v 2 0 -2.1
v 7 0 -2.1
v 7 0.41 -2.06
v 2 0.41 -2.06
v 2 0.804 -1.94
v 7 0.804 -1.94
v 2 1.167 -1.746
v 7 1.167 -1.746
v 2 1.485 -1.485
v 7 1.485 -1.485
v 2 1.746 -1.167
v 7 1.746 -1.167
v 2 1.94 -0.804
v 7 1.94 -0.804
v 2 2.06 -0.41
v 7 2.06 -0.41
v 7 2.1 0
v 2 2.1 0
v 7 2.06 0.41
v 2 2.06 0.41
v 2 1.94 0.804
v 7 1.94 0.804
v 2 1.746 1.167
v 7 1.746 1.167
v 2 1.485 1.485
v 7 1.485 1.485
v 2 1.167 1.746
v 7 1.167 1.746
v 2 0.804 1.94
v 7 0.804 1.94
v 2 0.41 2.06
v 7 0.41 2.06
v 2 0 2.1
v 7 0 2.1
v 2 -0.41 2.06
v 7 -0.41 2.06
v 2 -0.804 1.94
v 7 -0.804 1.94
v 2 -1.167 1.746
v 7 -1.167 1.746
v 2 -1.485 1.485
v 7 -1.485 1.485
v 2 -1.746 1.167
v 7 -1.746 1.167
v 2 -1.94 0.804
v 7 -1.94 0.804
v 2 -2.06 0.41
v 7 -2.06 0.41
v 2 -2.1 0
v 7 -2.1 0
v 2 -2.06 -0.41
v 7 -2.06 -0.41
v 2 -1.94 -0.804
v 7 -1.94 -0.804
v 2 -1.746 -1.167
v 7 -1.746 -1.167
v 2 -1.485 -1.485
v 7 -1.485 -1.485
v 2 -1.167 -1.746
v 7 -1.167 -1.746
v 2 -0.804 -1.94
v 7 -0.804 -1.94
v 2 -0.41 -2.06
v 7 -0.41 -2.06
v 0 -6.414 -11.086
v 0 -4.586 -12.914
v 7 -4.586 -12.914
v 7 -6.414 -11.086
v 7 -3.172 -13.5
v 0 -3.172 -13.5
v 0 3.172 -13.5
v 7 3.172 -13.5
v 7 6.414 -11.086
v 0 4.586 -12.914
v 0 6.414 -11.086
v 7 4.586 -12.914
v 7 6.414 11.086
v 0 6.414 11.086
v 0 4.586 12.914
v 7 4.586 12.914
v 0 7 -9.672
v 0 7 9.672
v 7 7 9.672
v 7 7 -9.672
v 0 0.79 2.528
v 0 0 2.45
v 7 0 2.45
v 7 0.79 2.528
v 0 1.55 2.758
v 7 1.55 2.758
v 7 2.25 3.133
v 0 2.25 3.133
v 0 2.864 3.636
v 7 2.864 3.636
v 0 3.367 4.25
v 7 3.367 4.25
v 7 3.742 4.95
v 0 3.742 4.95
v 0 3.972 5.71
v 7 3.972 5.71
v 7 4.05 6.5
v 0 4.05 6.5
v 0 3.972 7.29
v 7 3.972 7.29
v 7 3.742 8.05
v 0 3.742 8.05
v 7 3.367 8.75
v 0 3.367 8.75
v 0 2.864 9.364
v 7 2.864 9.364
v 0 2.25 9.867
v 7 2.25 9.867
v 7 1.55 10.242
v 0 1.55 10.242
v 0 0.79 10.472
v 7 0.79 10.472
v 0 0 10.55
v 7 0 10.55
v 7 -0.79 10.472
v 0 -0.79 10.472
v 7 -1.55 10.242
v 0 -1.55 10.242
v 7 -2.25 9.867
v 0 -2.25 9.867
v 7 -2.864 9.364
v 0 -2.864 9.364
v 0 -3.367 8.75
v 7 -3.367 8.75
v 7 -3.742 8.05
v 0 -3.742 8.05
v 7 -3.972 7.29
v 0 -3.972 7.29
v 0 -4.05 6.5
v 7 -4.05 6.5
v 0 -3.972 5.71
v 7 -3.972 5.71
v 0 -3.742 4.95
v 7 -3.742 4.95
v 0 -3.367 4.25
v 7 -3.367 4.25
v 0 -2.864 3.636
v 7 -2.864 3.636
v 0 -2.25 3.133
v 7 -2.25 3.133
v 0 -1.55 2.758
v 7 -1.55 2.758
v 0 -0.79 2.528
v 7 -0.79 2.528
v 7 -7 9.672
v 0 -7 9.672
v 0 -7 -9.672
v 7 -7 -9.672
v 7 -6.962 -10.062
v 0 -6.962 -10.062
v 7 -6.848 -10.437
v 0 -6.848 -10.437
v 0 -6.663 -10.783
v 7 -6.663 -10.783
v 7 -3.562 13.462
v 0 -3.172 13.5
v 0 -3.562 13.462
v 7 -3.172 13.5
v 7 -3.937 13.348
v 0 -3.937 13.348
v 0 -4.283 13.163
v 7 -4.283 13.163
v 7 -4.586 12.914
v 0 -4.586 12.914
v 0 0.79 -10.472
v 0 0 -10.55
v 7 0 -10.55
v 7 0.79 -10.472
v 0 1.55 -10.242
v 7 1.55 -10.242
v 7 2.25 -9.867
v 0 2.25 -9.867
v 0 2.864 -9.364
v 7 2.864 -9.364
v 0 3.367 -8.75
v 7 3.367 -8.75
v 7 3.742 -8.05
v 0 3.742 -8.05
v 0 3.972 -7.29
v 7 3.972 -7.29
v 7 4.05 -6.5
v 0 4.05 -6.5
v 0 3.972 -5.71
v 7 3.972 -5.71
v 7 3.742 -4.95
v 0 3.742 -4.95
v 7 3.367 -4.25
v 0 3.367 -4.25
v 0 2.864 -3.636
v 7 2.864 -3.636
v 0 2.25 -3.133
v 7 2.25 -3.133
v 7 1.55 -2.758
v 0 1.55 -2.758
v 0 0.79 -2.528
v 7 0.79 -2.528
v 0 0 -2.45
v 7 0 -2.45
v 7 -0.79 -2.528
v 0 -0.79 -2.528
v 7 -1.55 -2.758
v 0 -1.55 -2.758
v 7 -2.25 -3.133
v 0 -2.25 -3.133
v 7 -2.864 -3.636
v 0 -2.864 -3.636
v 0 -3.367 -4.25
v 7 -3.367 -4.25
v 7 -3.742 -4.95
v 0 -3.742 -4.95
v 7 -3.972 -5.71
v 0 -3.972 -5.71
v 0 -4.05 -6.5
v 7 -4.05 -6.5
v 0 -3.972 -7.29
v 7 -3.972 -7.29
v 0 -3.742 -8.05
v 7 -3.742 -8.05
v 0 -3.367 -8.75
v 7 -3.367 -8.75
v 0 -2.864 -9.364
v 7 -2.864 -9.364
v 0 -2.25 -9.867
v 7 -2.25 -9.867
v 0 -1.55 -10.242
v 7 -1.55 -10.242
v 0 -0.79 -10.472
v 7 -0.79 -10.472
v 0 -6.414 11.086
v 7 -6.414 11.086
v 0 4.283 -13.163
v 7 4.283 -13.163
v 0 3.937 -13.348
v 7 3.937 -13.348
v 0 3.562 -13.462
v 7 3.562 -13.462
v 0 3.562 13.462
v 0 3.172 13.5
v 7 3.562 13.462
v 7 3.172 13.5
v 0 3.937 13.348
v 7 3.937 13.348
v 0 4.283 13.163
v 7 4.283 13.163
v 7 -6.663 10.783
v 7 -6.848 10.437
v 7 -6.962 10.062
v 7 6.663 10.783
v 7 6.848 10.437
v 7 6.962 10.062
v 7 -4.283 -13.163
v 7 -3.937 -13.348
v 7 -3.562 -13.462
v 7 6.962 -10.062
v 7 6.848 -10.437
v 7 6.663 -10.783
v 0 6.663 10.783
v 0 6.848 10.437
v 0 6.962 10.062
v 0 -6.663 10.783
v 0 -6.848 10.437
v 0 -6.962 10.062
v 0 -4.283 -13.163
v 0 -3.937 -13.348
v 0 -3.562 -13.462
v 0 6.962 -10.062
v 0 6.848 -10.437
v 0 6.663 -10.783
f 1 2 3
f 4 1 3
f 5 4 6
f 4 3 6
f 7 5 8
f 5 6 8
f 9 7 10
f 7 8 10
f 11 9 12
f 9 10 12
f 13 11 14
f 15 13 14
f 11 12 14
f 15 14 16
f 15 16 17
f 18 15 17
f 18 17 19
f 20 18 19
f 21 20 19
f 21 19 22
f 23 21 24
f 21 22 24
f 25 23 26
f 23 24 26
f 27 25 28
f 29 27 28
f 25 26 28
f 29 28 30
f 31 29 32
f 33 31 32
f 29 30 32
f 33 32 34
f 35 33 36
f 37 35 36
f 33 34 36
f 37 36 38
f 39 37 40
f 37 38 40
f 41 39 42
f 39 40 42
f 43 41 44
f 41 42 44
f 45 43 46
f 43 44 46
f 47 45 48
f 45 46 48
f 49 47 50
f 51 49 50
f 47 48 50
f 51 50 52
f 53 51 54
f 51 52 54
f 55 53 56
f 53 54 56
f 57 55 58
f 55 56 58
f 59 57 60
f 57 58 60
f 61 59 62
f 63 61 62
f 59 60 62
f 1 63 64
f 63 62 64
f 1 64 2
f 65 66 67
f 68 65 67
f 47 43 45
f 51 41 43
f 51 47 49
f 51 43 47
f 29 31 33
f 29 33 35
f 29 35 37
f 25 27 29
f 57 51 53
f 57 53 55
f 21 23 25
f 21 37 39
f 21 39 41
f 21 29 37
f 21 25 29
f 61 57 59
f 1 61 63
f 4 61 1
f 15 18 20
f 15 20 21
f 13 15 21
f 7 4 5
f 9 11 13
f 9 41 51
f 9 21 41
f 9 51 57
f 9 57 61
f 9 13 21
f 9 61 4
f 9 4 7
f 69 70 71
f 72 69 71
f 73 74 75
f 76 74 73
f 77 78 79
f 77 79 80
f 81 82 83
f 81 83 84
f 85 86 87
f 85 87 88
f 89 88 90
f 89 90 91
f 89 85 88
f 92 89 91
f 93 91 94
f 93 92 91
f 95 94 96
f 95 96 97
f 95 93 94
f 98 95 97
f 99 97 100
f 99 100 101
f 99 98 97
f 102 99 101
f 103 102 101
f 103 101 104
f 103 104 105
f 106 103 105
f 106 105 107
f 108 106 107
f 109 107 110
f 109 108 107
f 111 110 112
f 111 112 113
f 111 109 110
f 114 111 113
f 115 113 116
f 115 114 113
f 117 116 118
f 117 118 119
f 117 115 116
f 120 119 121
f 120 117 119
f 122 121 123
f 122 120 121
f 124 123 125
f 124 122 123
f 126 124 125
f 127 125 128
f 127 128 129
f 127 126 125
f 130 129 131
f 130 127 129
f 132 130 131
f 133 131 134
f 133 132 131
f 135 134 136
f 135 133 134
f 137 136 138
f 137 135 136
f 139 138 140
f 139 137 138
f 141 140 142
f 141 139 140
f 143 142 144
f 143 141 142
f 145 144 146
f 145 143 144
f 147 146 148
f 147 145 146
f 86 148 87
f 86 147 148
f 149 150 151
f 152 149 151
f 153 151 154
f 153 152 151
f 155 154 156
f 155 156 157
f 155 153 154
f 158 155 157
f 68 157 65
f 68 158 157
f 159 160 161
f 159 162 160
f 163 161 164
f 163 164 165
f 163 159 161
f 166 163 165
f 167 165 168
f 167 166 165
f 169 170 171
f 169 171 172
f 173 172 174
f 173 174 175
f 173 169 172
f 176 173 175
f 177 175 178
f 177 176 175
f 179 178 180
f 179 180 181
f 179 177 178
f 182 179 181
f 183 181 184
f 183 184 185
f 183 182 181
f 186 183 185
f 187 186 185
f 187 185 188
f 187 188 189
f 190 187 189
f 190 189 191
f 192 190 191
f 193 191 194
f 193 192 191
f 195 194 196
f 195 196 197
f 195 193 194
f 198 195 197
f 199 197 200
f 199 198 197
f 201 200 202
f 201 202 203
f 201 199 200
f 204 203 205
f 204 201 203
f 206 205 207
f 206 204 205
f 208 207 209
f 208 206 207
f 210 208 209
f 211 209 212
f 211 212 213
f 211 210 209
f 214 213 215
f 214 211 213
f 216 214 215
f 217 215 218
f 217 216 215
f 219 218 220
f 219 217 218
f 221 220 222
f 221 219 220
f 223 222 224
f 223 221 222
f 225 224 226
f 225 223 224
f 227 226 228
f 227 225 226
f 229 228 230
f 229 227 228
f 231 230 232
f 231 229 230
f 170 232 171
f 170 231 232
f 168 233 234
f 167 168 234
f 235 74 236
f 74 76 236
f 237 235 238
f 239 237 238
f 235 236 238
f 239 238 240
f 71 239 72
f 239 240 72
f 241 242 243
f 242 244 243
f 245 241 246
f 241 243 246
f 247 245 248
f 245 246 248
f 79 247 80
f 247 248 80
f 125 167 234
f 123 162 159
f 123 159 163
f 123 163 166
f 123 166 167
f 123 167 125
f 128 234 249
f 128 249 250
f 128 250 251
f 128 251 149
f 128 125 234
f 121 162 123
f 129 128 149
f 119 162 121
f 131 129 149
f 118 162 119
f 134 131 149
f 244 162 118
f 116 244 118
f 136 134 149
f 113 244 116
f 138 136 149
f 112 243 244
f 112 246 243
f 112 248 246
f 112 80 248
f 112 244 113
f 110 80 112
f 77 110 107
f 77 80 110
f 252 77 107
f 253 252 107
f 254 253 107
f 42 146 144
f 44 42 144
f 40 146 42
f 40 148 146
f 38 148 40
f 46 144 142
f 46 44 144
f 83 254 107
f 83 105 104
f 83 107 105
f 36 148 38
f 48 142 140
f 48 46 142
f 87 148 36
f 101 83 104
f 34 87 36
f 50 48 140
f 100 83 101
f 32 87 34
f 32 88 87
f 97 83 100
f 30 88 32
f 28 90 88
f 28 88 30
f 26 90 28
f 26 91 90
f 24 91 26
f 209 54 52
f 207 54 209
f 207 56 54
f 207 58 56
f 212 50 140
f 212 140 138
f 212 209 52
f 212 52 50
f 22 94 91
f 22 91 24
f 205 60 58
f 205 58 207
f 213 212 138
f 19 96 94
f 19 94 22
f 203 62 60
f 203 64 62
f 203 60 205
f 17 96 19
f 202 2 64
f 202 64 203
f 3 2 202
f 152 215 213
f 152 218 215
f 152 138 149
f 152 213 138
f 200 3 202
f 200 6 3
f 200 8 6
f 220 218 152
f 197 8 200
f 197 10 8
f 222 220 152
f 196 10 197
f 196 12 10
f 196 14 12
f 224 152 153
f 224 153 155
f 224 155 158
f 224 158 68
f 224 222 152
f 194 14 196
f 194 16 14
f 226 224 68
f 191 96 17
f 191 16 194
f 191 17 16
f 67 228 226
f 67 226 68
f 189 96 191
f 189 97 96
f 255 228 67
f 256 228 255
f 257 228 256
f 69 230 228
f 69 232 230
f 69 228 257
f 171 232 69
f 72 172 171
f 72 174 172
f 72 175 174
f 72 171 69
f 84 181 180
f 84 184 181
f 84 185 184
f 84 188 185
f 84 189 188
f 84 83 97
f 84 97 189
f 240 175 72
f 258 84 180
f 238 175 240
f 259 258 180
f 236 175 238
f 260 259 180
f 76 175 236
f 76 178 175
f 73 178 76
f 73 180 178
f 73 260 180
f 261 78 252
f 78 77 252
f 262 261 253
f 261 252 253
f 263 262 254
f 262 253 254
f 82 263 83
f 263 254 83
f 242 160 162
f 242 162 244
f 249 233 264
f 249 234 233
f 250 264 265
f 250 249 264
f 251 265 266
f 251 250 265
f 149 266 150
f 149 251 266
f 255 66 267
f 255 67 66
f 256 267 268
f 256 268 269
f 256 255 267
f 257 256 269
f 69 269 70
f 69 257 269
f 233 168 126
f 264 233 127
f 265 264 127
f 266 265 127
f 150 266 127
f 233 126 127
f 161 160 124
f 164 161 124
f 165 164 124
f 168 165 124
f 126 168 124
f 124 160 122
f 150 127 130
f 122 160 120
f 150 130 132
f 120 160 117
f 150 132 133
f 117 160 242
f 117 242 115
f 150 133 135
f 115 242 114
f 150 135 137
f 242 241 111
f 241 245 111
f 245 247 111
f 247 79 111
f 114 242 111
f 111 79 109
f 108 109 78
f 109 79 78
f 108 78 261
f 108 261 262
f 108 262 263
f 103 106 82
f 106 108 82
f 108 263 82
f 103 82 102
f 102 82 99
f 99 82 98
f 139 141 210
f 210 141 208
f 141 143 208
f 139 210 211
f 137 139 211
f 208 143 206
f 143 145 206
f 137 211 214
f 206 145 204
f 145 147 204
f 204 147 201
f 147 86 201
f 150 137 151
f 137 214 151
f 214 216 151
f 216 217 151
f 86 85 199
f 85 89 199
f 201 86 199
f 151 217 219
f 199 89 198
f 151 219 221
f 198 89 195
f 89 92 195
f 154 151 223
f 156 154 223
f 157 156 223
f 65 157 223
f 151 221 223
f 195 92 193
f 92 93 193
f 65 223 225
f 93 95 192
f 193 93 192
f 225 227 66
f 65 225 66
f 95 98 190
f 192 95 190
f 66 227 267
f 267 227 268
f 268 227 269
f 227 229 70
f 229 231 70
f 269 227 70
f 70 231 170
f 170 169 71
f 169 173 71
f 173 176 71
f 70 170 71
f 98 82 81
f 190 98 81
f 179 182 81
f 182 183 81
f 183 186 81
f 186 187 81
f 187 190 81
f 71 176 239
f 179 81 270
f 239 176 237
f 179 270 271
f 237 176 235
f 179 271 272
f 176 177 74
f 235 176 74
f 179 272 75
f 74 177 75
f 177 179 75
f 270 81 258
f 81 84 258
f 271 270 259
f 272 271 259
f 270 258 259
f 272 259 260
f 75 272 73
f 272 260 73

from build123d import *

# Parameters (mm, degrees)
SKETCH1_W           = 27
SKETCH1_H           = 14
SKETCH1_R           = 4.05
BOSS_EXTRUDE1_DEPTH = 7
SKETCH3_R           = 2.1
CUT_EXTRUDE4_DEPTH  = 5
CHANFREIN1_SIZE     = 3
CONG_1_R            = 2


with BuildPart() as part:
    # Sketch1 → Boss-Extrude1 (new body)
    with BuildSketch(Plane(origin=(0, 0, 0), x_dir=(0, 0, -1), z_dir=(1, 0, 0))):
        Rectangle(SKETCH1_W, SKETCH1_H)
        with Locations((-6.5, 0)):
            Circle(SKETCH1_R, mode=Mode.SUBTRACT)
        with Locations((6.5, 0)):
            Circle(SKETCH1_R, mode=Mode.SUBTRACT)
    extrude(amount=BOSS_EXTRUDE1_DEPTH)

    # Sketch3 → Cut-Extrude4 (cut)
    with BuildSketch(Plane(origin=(7, 0, 0), x_dir=(0, 0, -1), z_dir=(1, 0, 0))):
        Circle(SKETCH3_R)
    extrude(amount=-CUT_EXTRUDE4_DEPTH, mode=Mode.SUBTRACT)

    # Chanfrein1
    chanfrein1_edges = [part.edges().sort_by_distance(p)[0] for p in [
        (3.5, 7, 13.5),
        (3.5, 7, -13.5),
        (3.5, -7, -13.5),
        (3.5, -7, 13.5),
    ]]
    chamfer(chanfrein1_edges, length=CHANFREIN1_SIZE)

    # Congé1
    cong_1_edges = [part.edges().sort_by_distance(p)[0] for p in [
        (3.5, -4, 13.5),
        (3.5, 4, 13.5),
        (3.5, 7, -10.5),
        (3.5, 7, 10.5),
        (3.5, -7, -10.5),
        (3.5, -7, 10.5),
        (3.5, 4, -13.5),
        (3.5, -4, -13.5),
    ]]
    fillet(cong_1_edges, radius=CONG_1_R)


solid = part.part
